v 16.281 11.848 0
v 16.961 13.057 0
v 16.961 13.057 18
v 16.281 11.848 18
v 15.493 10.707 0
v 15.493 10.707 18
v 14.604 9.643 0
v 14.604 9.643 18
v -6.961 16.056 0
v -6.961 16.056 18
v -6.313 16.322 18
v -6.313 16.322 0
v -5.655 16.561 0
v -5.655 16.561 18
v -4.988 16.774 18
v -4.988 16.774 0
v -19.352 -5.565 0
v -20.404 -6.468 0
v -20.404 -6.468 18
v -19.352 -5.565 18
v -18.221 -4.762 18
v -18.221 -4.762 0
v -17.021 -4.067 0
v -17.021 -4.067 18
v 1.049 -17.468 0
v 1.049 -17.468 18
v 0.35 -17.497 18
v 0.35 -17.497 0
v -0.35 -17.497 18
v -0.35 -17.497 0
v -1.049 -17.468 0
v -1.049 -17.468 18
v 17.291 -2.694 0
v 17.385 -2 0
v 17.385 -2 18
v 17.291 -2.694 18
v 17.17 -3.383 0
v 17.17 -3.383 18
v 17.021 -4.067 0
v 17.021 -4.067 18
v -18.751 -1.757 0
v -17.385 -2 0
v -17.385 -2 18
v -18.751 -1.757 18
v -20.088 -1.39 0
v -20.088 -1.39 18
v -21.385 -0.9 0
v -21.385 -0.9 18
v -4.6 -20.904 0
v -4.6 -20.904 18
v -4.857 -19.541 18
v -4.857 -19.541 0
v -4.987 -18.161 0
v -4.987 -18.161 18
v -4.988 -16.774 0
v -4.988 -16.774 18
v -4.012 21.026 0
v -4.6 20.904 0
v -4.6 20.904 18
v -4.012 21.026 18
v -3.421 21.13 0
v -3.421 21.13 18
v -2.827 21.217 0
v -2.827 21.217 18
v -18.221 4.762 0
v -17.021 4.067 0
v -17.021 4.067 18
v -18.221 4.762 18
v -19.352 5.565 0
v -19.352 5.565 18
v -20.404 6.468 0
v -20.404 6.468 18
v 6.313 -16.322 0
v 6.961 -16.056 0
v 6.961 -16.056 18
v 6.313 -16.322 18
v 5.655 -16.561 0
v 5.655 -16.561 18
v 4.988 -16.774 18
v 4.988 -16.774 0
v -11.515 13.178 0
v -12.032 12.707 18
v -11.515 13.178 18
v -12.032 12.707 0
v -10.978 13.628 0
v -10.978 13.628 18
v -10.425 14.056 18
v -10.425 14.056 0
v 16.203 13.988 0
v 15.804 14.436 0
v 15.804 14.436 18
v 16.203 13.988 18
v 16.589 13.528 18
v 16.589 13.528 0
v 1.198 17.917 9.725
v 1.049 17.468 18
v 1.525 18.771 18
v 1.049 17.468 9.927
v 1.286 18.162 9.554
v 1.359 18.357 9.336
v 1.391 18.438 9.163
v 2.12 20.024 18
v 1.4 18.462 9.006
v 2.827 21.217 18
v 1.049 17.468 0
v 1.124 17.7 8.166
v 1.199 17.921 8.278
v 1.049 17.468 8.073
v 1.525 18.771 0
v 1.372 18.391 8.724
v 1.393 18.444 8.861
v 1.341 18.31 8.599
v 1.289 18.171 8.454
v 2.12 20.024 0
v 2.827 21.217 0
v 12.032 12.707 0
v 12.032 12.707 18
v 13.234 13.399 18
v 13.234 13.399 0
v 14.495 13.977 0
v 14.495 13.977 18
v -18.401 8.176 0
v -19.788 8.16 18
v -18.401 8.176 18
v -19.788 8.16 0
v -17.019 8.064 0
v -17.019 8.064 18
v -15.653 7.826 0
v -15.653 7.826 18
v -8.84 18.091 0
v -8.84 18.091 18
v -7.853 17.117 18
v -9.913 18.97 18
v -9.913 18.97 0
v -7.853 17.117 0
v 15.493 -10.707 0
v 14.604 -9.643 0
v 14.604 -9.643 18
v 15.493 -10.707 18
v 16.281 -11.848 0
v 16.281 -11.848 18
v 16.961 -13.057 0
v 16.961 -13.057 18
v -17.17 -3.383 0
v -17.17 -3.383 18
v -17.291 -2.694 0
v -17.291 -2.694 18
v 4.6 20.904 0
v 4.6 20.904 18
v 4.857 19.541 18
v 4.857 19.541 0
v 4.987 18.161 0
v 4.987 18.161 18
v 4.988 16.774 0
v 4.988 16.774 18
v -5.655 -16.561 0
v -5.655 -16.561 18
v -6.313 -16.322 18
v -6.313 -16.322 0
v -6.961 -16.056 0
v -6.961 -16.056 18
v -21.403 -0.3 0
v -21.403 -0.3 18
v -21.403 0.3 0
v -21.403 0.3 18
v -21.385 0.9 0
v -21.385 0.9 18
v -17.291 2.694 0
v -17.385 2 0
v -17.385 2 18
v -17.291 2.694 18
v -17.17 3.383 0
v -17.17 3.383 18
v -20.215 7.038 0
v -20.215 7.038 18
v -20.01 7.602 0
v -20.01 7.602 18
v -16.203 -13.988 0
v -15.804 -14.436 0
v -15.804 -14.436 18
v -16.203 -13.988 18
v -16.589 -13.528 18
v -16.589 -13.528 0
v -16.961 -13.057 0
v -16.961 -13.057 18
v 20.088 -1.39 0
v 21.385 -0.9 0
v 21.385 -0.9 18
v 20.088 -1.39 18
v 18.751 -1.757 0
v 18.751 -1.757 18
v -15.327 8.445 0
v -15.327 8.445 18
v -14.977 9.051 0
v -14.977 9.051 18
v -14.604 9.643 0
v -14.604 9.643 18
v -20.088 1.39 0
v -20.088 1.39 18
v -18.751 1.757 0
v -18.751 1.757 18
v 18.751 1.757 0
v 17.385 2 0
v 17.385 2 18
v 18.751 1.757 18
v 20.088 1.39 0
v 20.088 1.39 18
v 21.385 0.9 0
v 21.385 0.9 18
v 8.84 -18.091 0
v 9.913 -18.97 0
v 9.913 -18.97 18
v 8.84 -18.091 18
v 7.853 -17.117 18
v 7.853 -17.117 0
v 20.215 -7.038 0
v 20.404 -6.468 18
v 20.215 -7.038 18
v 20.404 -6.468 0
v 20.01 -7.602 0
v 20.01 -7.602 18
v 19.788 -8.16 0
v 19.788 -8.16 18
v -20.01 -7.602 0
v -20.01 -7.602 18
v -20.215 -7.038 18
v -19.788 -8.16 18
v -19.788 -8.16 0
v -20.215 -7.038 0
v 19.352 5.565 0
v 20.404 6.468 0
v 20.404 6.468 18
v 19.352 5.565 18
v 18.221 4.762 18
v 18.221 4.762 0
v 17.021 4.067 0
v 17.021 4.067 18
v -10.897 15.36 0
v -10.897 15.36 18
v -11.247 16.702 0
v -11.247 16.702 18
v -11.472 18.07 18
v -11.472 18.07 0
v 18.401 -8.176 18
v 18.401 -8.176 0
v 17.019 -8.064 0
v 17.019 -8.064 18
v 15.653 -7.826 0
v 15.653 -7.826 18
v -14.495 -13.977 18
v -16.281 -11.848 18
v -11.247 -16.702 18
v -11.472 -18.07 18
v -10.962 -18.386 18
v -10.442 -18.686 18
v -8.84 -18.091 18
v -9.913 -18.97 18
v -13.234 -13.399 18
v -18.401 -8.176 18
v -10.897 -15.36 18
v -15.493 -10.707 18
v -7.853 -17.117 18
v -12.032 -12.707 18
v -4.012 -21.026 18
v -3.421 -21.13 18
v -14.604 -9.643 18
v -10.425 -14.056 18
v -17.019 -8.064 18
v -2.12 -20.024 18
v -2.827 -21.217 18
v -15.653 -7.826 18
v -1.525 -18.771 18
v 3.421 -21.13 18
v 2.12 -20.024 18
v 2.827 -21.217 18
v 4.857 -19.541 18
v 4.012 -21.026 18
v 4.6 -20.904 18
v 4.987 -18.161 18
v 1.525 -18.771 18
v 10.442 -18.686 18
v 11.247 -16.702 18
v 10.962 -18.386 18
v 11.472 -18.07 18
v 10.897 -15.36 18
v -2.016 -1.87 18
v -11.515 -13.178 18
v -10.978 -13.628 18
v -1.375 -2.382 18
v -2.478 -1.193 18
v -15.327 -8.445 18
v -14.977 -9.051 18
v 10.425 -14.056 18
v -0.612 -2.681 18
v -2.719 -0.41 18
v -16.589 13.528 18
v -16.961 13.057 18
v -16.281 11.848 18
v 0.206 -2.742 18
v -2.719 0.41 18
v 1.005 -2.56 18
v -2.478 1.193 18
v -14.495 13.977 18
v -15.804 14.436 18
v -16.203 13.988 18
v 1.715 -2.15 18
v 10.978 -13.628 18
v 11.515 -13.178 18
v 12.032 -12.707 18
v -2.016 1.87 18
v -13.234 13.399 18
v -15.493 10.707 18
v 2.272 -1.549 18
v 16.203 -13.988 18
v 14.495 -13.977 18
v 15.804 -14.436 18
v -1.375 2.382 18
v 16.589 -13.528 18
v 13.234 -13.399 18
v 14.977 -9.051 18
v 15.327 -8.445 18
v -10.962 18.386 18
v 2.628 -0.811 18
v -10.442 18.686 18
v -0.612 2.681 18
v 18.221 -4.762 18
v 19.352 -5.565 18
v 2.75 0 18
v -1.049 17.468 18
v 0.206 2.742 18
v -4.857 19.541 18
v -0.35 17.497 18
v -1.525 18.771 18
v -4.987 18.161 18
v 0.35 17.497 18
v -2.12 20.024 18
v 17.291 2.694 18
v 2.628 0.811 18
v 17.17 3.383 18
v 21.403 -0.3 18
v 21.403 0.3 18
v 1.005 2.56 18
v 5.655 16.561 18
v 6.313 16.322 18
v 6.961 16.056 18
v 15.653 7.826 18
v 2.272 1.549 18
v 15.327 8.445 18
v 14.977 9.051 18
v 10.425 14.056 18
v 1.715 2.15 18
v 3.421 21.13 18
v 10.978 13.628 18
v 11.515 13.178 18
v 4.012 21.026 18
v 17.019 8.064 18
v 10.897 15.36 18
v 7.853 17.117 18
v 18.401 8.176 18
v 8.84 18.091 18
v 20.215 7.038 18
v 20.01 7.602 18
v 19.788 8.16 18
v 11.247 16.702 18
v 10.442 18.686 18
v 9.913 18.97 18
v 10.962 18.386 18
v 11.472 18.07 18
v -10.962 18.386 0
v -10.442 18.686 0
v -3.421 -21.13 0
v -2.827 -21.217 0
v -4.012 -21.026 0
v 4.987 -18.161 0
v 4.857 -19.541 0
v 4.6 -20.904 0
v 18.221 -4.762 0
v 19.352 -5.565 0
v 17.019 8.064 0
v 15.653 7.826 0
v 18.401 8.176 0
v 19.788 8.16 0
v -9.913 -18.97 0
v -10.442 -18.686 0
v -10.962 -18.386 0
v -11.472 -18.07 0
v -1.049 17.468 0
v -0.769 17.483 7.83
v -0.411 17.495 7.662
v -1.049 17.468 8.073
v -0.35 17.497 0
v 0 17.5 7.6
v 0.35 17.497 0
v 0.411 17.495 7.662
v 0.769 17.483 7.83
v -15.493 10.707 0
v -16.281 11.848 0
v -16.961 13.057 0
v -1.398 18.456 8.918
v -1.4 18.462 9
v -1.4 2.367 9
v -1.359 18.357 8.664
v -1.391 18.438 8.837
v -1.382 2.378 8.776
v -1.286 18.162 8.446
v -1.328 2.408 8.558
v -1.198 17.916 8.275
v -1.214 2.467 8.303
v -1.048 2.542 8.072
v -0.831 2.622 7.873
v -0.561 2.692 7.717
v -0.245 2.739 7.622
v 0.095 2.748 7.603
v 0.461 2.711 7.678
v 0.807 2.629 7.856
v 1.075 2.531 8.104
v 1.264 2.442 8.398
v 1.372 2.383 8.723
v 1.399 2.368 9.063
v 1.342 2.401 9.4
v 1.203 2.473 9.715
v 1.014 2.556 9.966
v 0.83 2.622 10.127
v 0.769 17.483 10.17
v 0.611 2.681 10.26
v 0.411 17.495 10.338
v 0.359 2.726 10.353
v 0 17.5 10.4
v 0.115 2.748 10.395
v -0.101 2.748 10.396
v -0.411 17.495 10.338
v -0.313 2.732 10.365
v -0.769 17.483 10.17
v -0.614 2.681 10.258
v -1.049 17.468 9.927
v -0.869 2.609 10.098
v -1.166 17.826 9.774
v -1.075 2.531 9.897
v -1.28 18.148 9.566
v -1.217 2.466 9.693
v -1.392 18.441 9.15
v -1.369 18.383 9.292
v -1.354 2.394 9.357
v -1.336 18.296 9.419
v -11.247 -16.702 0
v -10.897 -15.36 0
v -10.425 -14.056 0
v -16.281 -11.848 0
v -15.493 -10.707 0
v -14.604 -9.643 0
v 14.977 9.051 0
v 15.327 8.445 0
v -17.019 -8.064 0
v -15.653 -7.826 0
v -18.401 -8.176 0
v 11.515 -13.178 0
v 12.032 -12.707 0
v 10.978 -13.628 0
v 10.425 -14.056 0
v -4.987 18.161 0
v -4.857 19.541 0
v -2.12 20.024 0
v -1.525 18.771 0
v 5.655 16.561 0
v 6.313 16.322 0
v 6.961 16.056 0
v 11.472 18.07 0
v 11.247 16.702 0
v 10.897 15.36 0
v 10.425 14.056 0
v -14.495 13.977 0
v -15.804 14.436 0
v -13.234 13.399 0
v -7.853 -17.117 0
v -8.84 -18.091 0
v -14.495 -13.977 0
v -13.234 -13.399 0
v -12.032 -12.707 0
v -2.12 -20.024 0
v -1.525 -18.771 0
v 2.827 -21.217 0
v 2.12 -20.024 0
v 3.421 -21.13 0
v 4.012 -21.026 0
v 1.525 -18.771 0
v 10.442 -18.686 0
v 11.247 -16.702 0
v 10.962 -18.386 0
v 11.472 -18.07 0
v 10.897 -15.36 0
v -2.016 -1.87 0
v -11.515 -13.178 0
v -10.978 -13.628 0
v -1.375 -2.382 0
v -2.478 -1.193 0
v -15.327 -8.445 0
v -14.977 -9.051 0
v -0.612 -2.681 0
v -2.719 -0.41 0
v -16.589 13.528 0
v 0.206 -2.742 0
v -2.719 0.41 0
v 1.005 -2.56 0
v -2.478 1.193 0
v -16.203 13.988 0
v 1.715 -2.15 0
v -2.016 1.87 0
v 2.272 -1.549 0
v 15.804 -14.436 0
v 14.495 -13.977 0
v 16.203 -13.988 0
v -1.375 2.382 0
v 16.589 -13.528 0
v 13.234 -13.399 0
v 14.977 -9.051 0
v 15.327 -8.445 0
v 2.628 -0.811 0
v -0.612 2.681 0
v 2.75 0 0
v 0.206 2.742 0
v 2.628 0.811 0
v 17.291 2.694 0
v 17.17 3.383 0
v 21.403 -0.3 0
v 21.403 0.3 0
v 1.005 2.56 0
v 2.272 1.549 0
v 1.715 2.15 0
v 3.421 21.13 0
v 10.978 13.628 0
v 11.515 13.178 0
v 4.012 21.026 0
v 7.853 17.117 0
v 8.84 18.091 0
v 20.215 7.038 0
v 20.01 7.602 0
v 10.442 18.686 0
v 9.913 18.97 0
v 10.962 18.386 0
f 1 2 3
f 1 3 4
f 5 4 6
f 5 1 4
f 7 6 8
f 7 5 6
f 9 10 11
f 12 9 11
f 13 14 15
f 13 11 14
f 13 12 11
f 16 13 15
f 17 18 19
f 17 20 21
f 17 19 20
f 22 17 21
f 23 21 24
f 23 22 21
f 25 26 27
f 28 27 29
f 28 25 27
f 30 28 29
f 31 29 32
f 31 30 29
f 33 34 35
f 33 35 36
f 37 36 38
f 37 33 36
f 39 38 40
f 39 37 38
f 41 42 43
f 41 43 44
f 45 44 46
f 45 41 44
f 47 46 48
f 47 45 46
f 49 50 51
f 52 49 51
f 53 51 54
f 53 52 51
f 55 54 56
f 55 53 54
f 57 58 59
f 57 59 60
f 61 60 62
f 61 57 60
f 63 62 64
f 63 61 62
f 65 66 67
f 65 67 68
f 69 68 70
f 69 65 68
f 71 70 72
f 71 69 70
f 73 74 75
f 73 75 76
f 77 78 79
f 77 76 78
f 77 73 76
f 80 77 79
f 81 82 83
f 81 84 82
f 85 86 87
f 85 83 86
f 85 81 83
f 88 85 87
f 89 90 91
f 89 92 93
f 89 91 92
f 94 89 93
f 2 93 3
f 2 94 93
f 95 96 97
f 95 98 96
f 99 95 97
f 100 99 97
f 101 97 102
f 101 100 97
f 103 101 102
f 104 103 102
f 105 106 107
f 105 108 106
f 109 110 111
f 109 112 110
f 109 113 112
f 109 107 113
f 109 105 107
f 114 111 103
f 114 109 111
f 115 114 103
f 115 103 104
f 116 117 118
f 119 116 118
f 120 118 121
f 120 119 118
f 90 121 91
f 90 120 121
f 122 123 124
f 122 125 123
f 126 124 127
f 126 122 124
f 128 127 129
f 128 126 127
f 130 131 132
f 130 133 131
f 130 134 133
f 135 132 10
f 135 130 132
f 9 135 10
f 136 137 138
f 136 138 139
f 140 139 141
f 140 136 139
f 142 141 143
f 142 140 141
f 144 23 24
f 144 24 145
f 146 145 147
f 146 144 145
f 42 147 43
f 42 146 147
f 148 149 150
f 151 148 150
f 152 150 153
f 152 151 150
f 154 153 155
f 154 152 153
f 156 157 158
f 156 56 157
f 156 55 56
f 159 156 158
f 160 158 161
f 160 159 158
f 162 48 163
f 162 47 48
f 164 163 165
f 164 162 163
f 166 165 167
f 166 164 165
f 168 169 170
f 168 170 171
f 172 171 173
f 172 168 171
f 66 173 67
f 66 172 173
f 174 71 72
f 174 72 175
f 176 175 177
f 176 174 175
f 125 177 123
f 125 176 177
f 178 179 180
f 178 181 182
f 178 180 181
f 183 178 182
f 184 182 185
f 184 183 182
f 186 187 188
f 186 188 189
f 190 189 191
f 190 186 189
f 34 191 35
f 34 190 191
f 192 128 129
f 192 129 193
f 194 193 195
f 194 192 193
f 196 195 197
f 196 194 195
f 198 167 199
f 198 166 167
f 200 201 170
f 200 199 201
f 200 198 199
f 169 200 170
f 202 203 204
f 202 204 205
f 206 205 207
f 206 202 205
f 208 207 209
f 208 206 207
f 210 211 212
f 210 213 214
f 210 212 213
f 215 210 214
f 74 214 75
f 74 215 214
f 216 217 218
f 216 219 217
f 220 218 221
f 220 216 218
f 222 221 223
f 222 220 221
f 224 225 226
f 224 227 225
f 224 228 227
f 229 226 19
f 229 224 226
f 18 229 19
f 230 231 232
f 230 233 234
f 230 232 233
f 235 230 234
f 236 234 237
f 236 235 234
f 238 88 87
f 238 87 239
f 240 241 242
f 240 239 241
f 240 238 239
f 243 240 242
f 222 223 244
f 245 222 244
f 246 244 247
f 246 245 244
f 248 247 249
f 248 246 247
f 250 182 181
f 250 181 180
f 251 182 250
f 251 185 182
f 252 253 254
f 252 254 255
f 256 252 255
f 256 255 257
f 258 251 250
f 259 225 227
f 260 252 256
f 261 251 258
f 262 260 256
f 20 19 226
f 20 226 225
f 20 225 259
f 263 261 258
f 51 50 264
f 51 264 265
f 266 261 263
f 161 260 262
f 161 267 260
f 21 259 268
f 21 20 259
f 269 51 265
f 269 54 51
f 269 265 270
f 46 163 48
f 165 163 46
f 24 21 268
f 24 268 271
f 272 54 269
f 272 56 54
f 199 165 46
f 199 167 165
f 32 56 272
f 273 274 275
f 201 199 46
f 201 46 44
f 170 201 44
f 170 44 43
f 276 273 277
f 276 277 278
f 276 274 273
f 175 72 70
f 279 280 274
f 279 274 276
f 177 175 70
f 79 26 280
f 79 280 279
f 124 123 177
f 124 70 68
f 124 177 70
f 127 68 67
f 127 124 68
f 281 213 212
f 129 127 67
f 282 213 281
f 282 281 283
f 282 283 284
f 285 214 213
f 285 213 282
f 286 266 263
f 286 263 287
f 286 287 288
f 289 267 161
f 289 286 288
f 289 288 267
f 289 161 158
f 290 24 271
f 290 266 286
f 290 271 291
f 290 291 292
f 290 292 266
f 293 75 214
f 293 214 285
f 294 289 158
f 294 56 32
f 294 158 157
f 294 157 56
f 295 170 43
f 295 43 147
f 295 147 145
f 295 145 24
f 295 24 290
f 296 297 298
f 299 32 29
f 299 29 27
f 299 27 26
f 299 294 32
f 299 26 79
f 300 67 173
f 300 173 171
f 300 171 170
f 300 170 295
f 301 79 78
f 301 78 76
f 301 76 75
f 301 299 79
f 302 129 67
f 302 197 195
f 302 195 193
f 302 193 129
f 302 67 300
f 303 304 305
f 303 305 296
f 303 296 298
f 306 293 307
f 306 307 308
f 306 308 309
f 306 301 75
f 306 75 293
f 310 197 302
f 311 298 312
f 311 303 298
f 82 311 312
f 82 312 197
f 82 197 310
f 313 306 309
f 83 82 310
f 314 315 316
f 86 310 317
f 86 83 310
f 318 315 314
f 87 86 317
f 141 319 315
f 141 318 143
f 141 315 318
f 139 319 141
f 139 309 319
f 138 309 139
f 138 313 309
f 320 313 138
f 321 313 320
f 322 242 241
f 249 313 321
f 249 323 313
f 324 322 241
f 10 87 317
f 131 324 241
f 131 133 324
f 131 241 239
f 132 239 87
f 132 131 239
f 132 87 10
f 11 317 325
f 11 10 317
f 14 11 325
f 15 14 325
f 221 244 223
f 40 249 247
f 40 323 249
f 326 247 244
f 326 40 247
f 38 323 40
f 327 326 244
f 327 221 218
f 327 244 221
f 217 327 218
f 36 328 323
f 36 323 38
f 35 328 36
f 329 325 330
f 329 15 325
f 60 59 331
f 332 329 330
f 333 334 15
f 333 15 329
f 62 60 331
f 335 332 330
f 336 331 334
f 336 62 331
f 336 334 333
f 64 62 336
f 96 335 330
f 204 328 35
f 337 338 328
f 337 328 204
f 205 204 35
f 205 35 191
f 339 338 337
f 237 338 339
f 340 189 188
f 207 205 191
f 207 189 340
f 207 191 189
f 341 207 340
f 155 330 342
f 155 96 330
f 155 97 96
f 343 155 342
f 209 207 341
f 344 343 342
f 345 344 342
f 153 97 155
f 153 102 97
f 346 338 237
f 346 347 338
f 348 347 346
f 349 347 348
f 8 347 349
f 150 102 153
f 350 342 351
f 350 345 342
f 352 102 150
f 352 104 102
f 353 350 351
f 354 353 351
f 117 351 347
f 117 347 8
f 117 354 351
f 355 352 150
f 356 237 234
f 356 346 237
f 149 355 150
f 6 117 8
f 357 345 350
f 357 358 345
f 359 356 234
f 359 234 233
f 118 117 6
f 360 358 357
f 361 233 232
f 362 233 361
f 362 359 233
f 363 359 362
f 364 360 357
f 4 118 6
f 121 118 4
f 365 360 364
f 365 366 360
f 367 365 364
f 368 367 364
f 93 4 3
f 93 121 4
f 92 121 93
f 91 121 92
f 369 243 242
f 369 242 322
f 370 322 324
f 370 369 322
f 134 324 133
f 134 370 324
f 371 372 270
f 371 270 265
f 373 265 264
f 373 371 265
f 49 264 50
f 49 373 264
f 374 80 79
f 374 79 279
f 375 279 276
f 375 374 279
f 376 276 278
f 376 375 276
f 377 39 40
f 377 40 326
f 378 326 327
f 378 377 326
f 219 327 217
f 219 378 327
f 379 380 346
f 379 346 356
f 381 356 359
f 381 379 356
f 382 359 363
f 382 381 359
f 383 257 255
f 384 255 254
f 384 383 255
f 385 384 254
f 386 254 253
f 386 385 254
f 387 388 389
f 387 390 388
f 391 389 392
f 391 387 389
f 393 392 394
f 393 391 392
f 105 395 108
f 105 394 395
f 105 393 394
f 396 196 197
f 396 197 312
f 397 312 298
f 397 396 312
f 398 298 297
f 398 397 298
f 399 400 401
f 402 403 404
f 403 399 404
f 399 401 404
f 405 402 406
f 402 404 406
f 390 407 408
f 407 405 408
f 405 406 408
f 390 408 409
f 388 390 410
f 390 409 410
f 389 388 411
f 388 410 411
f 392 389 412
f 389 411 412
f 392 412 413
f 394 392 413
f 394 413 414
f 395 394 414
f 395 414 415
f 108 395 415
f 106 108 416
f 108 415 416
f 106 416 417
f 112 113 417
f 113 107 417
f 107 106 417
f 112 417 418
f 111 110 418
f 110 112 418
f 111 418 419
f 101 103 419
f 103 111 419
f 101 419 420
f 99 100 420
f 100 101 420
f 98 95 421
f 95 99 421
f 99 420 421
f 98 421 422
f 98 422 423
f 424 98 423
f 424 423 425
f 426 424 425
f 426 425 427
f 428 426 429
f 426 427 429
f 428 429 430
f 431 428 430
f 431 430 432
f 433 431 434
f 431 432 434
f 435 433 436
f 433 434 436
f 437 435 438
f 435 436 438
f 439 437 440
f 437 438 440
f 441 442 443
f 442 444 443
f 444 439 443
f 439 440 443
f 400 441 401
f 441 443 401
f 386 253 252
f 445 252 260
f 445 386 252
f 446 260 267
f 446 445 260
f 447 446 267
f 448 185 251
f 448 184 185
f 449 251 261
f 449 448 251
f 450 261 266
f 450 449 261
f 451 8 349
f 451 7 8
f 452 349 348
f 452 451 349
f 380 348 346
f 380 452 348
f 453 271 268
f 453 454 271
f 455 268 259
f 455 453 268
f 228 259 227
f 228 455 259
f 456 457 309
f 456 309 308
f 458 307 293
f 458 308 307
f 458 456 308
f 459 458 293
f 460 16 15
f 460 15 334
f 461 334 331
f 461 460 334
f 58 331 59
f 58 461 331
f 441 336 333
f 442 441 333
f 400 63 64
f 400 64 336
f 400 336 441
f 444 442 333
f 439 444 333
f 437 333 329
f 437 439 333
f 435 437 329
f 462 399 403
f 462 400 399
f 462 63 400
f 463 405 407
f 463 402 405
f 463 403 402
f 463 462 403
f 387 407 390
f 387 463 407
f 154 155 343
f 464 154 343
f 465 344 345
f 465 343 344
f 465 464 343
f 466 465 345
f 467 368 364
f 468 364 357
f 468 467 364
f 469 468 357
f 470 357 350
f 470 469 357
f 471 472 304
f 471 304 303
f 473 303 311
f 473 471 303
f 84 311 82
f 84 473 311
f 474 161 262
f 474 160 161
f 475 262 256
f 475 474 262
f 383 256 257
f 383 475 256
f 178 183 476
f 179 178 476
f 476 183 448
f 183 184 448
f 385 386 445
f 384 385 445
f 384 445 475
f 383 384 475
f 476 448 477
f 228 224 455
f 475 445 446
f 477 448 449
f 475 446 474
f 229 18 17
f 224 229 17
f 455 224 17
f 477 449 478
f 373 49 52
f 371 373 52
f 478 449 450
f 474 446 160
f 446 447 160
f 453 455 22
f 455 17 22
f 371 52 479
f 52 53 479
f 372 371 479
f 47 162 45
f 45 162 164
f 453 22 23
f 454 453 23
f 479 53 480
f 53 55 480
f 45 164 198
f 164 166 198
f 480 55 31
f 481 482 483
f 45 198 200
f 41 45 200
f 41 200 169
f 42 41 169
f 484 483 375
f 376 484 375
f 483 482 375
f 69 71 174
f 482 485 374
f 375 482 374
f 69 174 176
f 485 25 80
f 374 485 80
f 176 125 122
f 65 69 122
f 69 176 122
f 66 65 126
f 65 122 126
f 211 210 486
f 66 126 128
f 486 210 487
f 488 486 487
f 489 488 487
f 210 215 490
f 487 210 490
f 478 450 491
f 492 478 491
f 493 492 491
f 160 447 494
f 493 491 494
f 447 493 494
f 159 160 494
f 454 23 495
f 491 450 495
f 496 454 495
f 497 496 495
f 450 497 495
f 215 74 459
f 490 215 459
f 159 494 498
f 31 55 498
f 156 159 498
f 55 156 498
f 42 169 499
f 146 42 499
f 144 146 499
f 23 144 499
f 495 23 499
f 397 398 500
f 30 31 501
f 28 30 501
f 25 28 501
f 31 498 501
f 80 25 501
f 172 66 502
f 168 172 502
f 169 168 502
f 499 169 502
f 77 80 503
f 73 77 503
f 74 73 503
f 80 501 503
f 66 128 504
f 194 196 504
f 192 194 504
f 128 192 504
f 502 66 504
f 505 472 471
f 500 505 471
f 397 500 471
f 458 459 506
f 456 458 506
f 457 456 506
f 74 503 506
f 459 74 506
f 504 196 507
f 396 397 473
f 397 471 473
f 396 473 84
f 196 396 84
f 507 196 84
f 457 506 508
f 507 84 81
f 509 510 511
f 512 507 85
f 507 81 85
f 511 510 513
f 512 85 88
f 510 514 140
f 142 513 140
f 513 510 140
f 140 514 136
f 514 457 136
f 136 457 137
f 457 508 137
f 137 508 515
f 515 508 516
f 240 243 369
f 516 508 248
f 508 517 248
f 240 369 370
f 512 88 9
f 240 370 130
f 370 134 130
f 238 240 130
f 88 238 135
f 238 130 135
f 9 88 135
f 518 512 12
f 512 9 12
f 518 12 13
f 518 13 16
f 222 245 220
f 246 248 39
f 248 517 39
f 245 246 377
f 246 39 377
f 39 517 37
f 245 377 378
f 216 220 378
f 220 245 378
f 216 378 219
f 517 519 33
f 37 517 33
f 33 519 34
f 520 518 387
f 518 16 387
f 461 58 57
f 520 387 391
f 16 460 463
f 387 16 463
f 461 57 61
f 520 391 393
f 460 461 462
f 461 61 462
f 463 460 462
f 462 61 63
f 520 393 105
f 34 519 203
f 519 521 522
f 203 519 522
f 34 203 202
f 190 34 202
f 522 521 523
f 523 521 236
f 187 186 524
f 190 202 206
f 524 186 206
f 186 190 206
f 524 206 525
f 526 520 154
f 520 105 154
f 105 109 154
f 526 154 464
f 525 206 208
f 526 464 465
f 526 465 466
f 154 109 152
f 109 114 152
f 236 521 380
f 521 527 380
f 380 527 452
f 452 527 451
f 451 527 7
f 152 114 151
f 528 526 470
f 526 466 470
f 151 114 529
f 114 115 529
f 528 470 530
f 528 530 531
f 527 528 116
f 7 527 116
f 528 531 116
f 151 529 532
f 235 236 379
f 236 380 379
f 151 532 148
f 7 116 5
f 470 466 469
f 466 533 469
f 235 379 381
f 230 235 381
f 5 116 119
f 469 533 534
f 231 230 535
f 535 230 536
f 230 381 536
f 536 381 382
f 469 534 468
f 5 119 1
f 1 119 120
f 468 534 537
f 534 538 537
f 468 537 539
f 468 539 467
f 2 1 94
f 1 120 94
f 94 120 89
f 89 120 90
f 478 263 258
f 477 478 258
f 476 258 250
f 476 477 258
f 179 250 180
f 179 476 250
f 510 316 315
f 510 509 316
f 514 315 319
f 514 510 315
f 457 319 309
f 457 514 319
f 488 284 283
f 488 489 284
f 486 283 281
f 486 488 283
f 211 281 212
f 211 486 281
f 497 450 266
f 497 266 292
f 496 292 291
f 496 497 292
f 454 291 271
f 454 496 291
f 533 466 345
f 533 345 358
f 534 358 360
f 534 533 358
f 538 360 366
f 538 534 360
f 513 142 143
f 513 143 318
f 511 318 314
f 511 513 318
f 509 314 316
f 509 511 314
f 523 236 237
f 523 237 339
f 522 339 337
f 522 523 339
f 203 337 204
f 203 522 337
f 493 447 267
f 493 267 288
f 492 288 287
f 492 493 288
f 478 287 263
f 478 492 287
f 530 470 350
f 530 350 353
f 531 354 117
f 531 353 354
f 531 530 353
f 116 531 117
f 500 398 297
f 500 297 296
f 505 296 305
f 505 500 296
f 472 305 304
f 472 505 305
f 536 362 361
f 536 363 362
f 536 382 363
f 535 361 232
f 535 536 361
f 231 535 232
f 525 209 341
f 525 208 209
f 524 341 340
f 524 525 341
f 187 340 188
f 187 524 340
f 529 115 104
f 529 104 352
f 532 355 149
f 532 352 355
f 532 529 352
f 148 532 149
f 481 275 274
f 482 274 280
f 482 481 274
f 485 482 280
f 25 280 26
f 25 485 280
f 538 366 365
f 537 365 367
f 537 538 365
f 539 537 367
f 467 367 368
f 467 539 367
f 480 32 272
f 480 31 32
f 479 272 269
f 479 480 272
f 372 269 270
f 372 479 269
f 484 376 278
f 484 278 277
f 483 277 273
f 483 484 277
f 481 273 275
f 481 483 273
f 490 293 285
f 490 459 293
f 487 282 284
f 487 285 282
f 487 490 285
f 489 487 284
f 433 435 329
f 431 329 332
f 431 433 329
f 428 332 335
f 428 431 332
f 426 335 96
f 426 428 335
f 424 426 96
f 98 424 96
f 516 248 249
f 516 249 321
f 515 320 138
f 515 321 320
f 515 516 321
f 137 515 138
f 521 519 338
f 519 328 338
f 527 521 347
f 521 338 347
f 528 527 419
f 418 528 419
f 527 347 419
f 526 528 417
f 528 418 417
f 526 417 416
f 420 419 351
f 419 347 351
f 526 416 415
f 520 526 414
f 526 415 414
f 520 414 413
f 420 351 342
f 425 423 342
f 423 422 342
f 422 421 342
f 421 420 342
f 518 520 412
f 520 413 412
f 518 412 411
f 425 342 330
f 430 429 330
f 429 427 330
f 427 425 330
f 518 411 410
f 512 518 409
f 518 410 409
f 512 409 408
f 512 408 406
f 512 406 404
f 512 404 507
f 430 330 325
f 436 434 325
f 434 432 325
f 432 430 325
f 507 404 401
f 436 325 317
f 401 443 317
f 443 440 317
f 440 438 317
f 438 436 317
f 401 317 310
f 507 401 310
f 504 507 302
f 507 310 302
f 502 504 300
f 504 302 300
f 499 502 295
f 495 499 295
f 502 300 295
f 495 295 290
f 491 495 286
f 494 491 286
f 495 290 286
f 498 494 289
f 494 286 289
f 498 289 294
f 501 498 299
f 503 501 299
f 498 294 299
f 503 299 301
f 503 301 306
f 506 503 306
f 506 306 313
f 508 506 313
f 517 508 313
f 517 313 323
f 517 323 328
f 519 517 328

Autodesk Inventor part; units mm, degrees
ref_plane "YZ Plane" through (0, 0, 0) normal (1, 0, 0) x (0, 1, 0)
ref_plane "XZ Plane" through (0, 0, 0) normal (0, 1, 0) x (-1, 0, 0)
ref_plane "XY Plane" through (0, 0, 0) normal (0, 0, 1) x (1, 0, 0)
sketch "Sketch1" plane through (0, 0, 0) normal (0, 0, 1) x (1, 0, 0)
  circle A0 centre (0, 0) radius 17.5
  arc A1 (21.3853, 0.9) -> (17.3853, 2) centre (15.4462, -12.8741) ccw
  arc A2 (17.3853, -2) -> (21.3853, -0.9) centre (15.4462, 12.8741) ccw
  arc A3 (21.3853, -0.9) -> (21.3853, 0.9) centre (1.4056, 0) ccw
  line L0 (0, 0) -> (21.7354, 0) construction
  arc A4 (17.3853, -2) -> (17.3853, 2) centre (0, 0) ccw
  arc A5 (19.7878, 8.1599) -> (15.6528, 7.8255) centre (18.9179, -6.8148) ccw
  arc A6 (20.4035, 6.4685) -> (19.7878, 8.1599) centre (1.3208, 0.4807) ccw
  arc A7 (17.0209, 4.0668) -> (20.4035, 6.4685) centre (10.1115, 17.3806) ccw
  circle A8 centre (0, 0) radius 17.5
  arc A9 (17.0209, 4.0668) -> (15.6528, 7.8255) centre (0, 0) ccw
  arc A10 (15.8036, 14.4357) -> (12.0324, 12.7072) centre (20.1078, 0.0665) ccw
  arc A11 (16.9606, 13.0568) -> (15.8036, 14.4357) centre (1.0768, 0.9035) ccw
  arc A12 (14.6035, 9.643) -> (16.9606, 13.0568) centre (3.5571, 19.7908) ccw
  circle A13 centre (0, 0) radius 17.5
  arc A14 (14.6035, 9.643) -> (12.0324, 12.7072) centre (0, 0) ccw
  arc A15 (9.9132, 18.9702) -> (6.9606, 16.0561) centre (18.8724, 6.9397) ccw
  arc A16 (11.4721, 18.0702) -> (9.9132, 18.9702) centre (0.7028, 1.2173) ccw
  arc A17 (10.4247, 14.0561) -> (11.4721, 18.0702) centre (-3.4262, 19.8139) ccw
  circle A18 centre (0, 0) radius 17.5
  arc A19 (10.4247, 14.0561) -> (6.9606, 16.0561) centre (0, 0) ccw
  arc A20 (2.8272, 21.2167) -> (1.0493, 17.4685) centre (15.3607, 12.976) ccw
  arc A21 (4.5999, 20.9042) -> (2.8272, 21.2167) centre (0.2441, 1.3842) ccw
  arc A22 (4.9885, 16.7739) -> (4.5999, 20.9042) centre (-9.9963, 17.4471) ccw
  circle A23 centre (0, 0) radius 17.5
  arc A24 (4.9885, 16.7739) -> (1.0493, 17.4685) centre (0, 0) ccw
  arc A25 (-4.5999, 20.9042) -> (-4.9885, 16.7739) centre (9.9963, 17.4471) ccw
  arc A26 (-2.8272, 21.2167) -> (-4.5999, 20.9042) centre (-0.2441, 1.3842) ccw
  arc A27 (-1.0493, 17.4685) -> (-2.8272, 21.2167) centre (-15.3607, 12.976) ccw
  circle A28 centre (0, 0) radius 17.5
  arc A29 (-1.0493, 17.4685) -> (-4.9885, 16.7739) centre (0, 0) ccw
  arc A30 (-11.4721, 18.0702) -> (-10.4247, 14.0561) centre (3.4262, 19.8139) ccw
  arc A31 (-9.9132, 18.9702) -> (-11.4721, 18.0702) centre (-0.7028, 1.2173) ccw
  arc A32 (-6.9606, 16.0561) -> (-9.9132, 18.9702) centre (-18.8724, 6.9397) ccw
  circle A33 centre (0, 0) radius 17.5
  arc A34 (-6.9606, 16.0561) -> (-10.4247, 14.0561) centre (0, 0) ccw
  arc A35 (-16.9606, 13.0568) -> (-14.6035, 9.643) centre (-3.5571, 19.7908) ccw
  arc A36 (-15.8036, 14.4357) -> (-16.9606, 13.0568) centre (-1.0768, 0.9035) ccw
  arc A37 (-12.0324, 12.7072) -> (-15.8036, 14.4357) centre (-20.1078, 0.0665) ccw
  circle A38 centre (0, 0) radius 17.5
  arc A39 (-12.0324, 12.7072) -> (-14.6035, 9.643) centre (0, 0) ccw
  arc A40 (-20.4035, 6.4685) -> (-17.0209, 4.0668) centre (-10.1115, 17.3806) ccw
  arc A41 (-19.7878, 8.1599) -> (-20.4035, 6.4685) centre (-1.3208, 0.4807) ccw
  arc A42 (-15.6528, 7.8255) -> (-19.7878, 8.1599) centre (-18.9179, -6.8148) ccw
  circle A43 centre (0, 0) radius 17.5
  arc A44 (-15.6528, 7.8255) -> (-17.0209, 4.0668) centre (0, 0) ccw
  arc A45 (-21.3853, -0.9) -> (-17.3853, -2) centre (-15.4462, 12.8741) ccw
  arc A46 (-21.3853, 0.9) -> (-21.3853, -0.9) centre (-1.4056, 0) ccw
  arc A47 (-17.3853, 2) -> (-21.3853, 0.9) centre (-15.4462, -12.8741) ccw
  circle A48 centre (0, 0) radius 17.5
  arc A49 (-17.3853, 2) -> (-17.3853, -2) centre (0, 0) ccw
  arc A50 (-19.7878, -8.1599) -> (-15.6528, -7.8255) centre (-18.9179, 6.8148) ccw
  arc A51 (-20.4035, -6.4685) -> (-19.7878, -8.1599) centre (-1.3208, -0.4807) ccw
  arc A52 (-17.0209, -4.0668) -> (-20.4035, -6.4685) centre (-10.1115, -17.3806) ccw
  circle A53 centre (0, 0) radius 17.5
  arc A54 (-17.0209, -4.0668) -> (-15.6528, -7.8255) centre (0, 0) ccw
  arc A55 (-15.8036, -14.4357) -> (-12.0324, -12.7072) centre (-20.1078, -0.0665) ccw
  arc A56 (-16.9606, -13.0568) -> (-15.8036, -14.4357) centre (-1.0768, -0.9035) ccw
  arc A57 (-14.6035, -9.643) -> (-16.9606, -13.0568) centre (-3.5571, -19.7908) ccw
  circle A58 centre (0, 0) radius 17.5
  arc A59 (-14.6035, -9.643) -> (-12.0324, -12.7072) centre (0, 0) ccw
  arc A60 (-9.9132, -18.9702) -> (-6.9606, -16.0561) centre (-18.8724, -6.9397) ccw
  arc A61 (-11.4721, -18.0702) -> (-9.9132, -18.9702) centre (-0.7028, -1.2173) ccw
  arc A62 (-10.4247, -14.0561) -> (-11.4721, -18.0702) centre (3.4262, -19.8139) ccw
  circle A63 centre (0, 0) radius 17.5
  arc A64 (-10.4247, -14.0561) -> (-6.9606, -16.0561) centre (0, 0) ccw
  arc A65 (-2.8272, -21.2167) -> (-1.0493, -17.4685) centre (-15.3607, -12.976) ccw
  arc A66 (-4.5999, -20.9042) -> (-2.8272, -21.2167) centre (-0.2441, -1.3842) ccw
  arc A67 (-4.9885, -16.7739) -> (-4.5999, -20.9042) centre (9.9963, -17.4471) ccw
  circle A68 centre (0, 0) radius 17.5
  arc A69 (-4.9885, -16.7739) -> (-1.0493, -17.4685) centre (0, 0) ccw
  arc A70 (4.5999, -20.9042) -> (4.9885, -16.7739) centre (-9.9963, -17.4471) ccw
  arc A71 (2.8272, -21.2167) -> (4.5999, -20.9042) centre (0.2441, -1.3842) ccw
  arc A72 (1.0493, -17.4685) -> (2.8272, -21.2167) centre (15.3607, -12.976) ccw
  circle A73 centre (0, 0) radius 17.5
  arc A74 (1.0493, -17.4685) -> (4.9885, -16.7739) centre (0, 0) ccw
  arc A75 (11.4721, -18.0702) -> (10.4247, -14.0561) centre (-3.4262, -19.8139) ccw
  arc A76 (9.9132, -18.9702) -> (11.4721, -18.0702) centre (0.7028, -1.2173) ccw
  arc A77 (6.9606, -16.0561) -> (9.9132, -18.9702) centre (18.8724, -6.9397) ccw
  circle A78 centre (0, 0) radius 17.5
  arc A79 (6.9606, -16.0561) -> (10.4247, -14.0561) centre (0, 0) ccw
  arc A80 (16.9606, -13.0568) -> (14.6035, -9.643) centre (3.5571, -19.7908) ccw
  arc A81 (15.8036, -14.4357) -> (16.9606, -13.0568) centre (1.0768, -0.9035) ccw
  arc A82 (12.0324, -12.7072) -> (15.8036, -14.4357) centre (20.1078, -0.0665) ccw
  circle A83 centre (0, 0) radius 17.5
  arc A84 (12.0324, -12.7072) -> (14.6035, -9.643) centre (0, 0) ccw
  arc A85 (20.4035, -6.4685) -> (17.0209, -4.0668) centre (10.1115, -17.3806) ccw
  arc A86 (19.7878, -8.1599) -> (20.4035, -6.4685) centre (1.3208, -0.4807) ccw
  arc A87 (15.6528, -7.8255) -> (19.7878, -8.1599) centre (18.9179, 6.8148) ccw
  circle A88 centre (0, 0) radius 17.5
  arc A89 (15.6528, -7.8255) -> (17.0209, -4.0668) centre (0, 0) ccw
  dimension "d0" = 35
  dimension "d3" = 15
  dimension "d4" = 15
  dimension "d5" = 4
  dimension "d6" = 20
  dimension "d7" = 1.8
  dimension "d10" = 360
  dimension "d20" = 2
extrude "Extrusion1" add sketch "Sketch1" along normal blind 18
sketch "Sketch2" plane through (0, 0, 18) normal (0, 0, 1) x (1, 0, 0)
  circle A0 centre (0, 0) radius 2.75
  dimension "d14" = 5.5
extrude "Extrusion2" cut sketch "Sketch2" against normal through all
sketch "Sketch5" plane through (0, 0, 0) normal (0, 1, 0) x (-1, 0, 0)
  circle A0 centre (0, 9) radius 1.4
  line L0 (2.75, 18) -> (2.75, 0) projected
  point P0 (0, 0)
  point P1 (2.75, 9)
  dimension "d24" = 2.8
extrude "Extrusion5" cut sketch "Sketch5" along normal through all
properties part number "BA006" material "ABS Plastic"
